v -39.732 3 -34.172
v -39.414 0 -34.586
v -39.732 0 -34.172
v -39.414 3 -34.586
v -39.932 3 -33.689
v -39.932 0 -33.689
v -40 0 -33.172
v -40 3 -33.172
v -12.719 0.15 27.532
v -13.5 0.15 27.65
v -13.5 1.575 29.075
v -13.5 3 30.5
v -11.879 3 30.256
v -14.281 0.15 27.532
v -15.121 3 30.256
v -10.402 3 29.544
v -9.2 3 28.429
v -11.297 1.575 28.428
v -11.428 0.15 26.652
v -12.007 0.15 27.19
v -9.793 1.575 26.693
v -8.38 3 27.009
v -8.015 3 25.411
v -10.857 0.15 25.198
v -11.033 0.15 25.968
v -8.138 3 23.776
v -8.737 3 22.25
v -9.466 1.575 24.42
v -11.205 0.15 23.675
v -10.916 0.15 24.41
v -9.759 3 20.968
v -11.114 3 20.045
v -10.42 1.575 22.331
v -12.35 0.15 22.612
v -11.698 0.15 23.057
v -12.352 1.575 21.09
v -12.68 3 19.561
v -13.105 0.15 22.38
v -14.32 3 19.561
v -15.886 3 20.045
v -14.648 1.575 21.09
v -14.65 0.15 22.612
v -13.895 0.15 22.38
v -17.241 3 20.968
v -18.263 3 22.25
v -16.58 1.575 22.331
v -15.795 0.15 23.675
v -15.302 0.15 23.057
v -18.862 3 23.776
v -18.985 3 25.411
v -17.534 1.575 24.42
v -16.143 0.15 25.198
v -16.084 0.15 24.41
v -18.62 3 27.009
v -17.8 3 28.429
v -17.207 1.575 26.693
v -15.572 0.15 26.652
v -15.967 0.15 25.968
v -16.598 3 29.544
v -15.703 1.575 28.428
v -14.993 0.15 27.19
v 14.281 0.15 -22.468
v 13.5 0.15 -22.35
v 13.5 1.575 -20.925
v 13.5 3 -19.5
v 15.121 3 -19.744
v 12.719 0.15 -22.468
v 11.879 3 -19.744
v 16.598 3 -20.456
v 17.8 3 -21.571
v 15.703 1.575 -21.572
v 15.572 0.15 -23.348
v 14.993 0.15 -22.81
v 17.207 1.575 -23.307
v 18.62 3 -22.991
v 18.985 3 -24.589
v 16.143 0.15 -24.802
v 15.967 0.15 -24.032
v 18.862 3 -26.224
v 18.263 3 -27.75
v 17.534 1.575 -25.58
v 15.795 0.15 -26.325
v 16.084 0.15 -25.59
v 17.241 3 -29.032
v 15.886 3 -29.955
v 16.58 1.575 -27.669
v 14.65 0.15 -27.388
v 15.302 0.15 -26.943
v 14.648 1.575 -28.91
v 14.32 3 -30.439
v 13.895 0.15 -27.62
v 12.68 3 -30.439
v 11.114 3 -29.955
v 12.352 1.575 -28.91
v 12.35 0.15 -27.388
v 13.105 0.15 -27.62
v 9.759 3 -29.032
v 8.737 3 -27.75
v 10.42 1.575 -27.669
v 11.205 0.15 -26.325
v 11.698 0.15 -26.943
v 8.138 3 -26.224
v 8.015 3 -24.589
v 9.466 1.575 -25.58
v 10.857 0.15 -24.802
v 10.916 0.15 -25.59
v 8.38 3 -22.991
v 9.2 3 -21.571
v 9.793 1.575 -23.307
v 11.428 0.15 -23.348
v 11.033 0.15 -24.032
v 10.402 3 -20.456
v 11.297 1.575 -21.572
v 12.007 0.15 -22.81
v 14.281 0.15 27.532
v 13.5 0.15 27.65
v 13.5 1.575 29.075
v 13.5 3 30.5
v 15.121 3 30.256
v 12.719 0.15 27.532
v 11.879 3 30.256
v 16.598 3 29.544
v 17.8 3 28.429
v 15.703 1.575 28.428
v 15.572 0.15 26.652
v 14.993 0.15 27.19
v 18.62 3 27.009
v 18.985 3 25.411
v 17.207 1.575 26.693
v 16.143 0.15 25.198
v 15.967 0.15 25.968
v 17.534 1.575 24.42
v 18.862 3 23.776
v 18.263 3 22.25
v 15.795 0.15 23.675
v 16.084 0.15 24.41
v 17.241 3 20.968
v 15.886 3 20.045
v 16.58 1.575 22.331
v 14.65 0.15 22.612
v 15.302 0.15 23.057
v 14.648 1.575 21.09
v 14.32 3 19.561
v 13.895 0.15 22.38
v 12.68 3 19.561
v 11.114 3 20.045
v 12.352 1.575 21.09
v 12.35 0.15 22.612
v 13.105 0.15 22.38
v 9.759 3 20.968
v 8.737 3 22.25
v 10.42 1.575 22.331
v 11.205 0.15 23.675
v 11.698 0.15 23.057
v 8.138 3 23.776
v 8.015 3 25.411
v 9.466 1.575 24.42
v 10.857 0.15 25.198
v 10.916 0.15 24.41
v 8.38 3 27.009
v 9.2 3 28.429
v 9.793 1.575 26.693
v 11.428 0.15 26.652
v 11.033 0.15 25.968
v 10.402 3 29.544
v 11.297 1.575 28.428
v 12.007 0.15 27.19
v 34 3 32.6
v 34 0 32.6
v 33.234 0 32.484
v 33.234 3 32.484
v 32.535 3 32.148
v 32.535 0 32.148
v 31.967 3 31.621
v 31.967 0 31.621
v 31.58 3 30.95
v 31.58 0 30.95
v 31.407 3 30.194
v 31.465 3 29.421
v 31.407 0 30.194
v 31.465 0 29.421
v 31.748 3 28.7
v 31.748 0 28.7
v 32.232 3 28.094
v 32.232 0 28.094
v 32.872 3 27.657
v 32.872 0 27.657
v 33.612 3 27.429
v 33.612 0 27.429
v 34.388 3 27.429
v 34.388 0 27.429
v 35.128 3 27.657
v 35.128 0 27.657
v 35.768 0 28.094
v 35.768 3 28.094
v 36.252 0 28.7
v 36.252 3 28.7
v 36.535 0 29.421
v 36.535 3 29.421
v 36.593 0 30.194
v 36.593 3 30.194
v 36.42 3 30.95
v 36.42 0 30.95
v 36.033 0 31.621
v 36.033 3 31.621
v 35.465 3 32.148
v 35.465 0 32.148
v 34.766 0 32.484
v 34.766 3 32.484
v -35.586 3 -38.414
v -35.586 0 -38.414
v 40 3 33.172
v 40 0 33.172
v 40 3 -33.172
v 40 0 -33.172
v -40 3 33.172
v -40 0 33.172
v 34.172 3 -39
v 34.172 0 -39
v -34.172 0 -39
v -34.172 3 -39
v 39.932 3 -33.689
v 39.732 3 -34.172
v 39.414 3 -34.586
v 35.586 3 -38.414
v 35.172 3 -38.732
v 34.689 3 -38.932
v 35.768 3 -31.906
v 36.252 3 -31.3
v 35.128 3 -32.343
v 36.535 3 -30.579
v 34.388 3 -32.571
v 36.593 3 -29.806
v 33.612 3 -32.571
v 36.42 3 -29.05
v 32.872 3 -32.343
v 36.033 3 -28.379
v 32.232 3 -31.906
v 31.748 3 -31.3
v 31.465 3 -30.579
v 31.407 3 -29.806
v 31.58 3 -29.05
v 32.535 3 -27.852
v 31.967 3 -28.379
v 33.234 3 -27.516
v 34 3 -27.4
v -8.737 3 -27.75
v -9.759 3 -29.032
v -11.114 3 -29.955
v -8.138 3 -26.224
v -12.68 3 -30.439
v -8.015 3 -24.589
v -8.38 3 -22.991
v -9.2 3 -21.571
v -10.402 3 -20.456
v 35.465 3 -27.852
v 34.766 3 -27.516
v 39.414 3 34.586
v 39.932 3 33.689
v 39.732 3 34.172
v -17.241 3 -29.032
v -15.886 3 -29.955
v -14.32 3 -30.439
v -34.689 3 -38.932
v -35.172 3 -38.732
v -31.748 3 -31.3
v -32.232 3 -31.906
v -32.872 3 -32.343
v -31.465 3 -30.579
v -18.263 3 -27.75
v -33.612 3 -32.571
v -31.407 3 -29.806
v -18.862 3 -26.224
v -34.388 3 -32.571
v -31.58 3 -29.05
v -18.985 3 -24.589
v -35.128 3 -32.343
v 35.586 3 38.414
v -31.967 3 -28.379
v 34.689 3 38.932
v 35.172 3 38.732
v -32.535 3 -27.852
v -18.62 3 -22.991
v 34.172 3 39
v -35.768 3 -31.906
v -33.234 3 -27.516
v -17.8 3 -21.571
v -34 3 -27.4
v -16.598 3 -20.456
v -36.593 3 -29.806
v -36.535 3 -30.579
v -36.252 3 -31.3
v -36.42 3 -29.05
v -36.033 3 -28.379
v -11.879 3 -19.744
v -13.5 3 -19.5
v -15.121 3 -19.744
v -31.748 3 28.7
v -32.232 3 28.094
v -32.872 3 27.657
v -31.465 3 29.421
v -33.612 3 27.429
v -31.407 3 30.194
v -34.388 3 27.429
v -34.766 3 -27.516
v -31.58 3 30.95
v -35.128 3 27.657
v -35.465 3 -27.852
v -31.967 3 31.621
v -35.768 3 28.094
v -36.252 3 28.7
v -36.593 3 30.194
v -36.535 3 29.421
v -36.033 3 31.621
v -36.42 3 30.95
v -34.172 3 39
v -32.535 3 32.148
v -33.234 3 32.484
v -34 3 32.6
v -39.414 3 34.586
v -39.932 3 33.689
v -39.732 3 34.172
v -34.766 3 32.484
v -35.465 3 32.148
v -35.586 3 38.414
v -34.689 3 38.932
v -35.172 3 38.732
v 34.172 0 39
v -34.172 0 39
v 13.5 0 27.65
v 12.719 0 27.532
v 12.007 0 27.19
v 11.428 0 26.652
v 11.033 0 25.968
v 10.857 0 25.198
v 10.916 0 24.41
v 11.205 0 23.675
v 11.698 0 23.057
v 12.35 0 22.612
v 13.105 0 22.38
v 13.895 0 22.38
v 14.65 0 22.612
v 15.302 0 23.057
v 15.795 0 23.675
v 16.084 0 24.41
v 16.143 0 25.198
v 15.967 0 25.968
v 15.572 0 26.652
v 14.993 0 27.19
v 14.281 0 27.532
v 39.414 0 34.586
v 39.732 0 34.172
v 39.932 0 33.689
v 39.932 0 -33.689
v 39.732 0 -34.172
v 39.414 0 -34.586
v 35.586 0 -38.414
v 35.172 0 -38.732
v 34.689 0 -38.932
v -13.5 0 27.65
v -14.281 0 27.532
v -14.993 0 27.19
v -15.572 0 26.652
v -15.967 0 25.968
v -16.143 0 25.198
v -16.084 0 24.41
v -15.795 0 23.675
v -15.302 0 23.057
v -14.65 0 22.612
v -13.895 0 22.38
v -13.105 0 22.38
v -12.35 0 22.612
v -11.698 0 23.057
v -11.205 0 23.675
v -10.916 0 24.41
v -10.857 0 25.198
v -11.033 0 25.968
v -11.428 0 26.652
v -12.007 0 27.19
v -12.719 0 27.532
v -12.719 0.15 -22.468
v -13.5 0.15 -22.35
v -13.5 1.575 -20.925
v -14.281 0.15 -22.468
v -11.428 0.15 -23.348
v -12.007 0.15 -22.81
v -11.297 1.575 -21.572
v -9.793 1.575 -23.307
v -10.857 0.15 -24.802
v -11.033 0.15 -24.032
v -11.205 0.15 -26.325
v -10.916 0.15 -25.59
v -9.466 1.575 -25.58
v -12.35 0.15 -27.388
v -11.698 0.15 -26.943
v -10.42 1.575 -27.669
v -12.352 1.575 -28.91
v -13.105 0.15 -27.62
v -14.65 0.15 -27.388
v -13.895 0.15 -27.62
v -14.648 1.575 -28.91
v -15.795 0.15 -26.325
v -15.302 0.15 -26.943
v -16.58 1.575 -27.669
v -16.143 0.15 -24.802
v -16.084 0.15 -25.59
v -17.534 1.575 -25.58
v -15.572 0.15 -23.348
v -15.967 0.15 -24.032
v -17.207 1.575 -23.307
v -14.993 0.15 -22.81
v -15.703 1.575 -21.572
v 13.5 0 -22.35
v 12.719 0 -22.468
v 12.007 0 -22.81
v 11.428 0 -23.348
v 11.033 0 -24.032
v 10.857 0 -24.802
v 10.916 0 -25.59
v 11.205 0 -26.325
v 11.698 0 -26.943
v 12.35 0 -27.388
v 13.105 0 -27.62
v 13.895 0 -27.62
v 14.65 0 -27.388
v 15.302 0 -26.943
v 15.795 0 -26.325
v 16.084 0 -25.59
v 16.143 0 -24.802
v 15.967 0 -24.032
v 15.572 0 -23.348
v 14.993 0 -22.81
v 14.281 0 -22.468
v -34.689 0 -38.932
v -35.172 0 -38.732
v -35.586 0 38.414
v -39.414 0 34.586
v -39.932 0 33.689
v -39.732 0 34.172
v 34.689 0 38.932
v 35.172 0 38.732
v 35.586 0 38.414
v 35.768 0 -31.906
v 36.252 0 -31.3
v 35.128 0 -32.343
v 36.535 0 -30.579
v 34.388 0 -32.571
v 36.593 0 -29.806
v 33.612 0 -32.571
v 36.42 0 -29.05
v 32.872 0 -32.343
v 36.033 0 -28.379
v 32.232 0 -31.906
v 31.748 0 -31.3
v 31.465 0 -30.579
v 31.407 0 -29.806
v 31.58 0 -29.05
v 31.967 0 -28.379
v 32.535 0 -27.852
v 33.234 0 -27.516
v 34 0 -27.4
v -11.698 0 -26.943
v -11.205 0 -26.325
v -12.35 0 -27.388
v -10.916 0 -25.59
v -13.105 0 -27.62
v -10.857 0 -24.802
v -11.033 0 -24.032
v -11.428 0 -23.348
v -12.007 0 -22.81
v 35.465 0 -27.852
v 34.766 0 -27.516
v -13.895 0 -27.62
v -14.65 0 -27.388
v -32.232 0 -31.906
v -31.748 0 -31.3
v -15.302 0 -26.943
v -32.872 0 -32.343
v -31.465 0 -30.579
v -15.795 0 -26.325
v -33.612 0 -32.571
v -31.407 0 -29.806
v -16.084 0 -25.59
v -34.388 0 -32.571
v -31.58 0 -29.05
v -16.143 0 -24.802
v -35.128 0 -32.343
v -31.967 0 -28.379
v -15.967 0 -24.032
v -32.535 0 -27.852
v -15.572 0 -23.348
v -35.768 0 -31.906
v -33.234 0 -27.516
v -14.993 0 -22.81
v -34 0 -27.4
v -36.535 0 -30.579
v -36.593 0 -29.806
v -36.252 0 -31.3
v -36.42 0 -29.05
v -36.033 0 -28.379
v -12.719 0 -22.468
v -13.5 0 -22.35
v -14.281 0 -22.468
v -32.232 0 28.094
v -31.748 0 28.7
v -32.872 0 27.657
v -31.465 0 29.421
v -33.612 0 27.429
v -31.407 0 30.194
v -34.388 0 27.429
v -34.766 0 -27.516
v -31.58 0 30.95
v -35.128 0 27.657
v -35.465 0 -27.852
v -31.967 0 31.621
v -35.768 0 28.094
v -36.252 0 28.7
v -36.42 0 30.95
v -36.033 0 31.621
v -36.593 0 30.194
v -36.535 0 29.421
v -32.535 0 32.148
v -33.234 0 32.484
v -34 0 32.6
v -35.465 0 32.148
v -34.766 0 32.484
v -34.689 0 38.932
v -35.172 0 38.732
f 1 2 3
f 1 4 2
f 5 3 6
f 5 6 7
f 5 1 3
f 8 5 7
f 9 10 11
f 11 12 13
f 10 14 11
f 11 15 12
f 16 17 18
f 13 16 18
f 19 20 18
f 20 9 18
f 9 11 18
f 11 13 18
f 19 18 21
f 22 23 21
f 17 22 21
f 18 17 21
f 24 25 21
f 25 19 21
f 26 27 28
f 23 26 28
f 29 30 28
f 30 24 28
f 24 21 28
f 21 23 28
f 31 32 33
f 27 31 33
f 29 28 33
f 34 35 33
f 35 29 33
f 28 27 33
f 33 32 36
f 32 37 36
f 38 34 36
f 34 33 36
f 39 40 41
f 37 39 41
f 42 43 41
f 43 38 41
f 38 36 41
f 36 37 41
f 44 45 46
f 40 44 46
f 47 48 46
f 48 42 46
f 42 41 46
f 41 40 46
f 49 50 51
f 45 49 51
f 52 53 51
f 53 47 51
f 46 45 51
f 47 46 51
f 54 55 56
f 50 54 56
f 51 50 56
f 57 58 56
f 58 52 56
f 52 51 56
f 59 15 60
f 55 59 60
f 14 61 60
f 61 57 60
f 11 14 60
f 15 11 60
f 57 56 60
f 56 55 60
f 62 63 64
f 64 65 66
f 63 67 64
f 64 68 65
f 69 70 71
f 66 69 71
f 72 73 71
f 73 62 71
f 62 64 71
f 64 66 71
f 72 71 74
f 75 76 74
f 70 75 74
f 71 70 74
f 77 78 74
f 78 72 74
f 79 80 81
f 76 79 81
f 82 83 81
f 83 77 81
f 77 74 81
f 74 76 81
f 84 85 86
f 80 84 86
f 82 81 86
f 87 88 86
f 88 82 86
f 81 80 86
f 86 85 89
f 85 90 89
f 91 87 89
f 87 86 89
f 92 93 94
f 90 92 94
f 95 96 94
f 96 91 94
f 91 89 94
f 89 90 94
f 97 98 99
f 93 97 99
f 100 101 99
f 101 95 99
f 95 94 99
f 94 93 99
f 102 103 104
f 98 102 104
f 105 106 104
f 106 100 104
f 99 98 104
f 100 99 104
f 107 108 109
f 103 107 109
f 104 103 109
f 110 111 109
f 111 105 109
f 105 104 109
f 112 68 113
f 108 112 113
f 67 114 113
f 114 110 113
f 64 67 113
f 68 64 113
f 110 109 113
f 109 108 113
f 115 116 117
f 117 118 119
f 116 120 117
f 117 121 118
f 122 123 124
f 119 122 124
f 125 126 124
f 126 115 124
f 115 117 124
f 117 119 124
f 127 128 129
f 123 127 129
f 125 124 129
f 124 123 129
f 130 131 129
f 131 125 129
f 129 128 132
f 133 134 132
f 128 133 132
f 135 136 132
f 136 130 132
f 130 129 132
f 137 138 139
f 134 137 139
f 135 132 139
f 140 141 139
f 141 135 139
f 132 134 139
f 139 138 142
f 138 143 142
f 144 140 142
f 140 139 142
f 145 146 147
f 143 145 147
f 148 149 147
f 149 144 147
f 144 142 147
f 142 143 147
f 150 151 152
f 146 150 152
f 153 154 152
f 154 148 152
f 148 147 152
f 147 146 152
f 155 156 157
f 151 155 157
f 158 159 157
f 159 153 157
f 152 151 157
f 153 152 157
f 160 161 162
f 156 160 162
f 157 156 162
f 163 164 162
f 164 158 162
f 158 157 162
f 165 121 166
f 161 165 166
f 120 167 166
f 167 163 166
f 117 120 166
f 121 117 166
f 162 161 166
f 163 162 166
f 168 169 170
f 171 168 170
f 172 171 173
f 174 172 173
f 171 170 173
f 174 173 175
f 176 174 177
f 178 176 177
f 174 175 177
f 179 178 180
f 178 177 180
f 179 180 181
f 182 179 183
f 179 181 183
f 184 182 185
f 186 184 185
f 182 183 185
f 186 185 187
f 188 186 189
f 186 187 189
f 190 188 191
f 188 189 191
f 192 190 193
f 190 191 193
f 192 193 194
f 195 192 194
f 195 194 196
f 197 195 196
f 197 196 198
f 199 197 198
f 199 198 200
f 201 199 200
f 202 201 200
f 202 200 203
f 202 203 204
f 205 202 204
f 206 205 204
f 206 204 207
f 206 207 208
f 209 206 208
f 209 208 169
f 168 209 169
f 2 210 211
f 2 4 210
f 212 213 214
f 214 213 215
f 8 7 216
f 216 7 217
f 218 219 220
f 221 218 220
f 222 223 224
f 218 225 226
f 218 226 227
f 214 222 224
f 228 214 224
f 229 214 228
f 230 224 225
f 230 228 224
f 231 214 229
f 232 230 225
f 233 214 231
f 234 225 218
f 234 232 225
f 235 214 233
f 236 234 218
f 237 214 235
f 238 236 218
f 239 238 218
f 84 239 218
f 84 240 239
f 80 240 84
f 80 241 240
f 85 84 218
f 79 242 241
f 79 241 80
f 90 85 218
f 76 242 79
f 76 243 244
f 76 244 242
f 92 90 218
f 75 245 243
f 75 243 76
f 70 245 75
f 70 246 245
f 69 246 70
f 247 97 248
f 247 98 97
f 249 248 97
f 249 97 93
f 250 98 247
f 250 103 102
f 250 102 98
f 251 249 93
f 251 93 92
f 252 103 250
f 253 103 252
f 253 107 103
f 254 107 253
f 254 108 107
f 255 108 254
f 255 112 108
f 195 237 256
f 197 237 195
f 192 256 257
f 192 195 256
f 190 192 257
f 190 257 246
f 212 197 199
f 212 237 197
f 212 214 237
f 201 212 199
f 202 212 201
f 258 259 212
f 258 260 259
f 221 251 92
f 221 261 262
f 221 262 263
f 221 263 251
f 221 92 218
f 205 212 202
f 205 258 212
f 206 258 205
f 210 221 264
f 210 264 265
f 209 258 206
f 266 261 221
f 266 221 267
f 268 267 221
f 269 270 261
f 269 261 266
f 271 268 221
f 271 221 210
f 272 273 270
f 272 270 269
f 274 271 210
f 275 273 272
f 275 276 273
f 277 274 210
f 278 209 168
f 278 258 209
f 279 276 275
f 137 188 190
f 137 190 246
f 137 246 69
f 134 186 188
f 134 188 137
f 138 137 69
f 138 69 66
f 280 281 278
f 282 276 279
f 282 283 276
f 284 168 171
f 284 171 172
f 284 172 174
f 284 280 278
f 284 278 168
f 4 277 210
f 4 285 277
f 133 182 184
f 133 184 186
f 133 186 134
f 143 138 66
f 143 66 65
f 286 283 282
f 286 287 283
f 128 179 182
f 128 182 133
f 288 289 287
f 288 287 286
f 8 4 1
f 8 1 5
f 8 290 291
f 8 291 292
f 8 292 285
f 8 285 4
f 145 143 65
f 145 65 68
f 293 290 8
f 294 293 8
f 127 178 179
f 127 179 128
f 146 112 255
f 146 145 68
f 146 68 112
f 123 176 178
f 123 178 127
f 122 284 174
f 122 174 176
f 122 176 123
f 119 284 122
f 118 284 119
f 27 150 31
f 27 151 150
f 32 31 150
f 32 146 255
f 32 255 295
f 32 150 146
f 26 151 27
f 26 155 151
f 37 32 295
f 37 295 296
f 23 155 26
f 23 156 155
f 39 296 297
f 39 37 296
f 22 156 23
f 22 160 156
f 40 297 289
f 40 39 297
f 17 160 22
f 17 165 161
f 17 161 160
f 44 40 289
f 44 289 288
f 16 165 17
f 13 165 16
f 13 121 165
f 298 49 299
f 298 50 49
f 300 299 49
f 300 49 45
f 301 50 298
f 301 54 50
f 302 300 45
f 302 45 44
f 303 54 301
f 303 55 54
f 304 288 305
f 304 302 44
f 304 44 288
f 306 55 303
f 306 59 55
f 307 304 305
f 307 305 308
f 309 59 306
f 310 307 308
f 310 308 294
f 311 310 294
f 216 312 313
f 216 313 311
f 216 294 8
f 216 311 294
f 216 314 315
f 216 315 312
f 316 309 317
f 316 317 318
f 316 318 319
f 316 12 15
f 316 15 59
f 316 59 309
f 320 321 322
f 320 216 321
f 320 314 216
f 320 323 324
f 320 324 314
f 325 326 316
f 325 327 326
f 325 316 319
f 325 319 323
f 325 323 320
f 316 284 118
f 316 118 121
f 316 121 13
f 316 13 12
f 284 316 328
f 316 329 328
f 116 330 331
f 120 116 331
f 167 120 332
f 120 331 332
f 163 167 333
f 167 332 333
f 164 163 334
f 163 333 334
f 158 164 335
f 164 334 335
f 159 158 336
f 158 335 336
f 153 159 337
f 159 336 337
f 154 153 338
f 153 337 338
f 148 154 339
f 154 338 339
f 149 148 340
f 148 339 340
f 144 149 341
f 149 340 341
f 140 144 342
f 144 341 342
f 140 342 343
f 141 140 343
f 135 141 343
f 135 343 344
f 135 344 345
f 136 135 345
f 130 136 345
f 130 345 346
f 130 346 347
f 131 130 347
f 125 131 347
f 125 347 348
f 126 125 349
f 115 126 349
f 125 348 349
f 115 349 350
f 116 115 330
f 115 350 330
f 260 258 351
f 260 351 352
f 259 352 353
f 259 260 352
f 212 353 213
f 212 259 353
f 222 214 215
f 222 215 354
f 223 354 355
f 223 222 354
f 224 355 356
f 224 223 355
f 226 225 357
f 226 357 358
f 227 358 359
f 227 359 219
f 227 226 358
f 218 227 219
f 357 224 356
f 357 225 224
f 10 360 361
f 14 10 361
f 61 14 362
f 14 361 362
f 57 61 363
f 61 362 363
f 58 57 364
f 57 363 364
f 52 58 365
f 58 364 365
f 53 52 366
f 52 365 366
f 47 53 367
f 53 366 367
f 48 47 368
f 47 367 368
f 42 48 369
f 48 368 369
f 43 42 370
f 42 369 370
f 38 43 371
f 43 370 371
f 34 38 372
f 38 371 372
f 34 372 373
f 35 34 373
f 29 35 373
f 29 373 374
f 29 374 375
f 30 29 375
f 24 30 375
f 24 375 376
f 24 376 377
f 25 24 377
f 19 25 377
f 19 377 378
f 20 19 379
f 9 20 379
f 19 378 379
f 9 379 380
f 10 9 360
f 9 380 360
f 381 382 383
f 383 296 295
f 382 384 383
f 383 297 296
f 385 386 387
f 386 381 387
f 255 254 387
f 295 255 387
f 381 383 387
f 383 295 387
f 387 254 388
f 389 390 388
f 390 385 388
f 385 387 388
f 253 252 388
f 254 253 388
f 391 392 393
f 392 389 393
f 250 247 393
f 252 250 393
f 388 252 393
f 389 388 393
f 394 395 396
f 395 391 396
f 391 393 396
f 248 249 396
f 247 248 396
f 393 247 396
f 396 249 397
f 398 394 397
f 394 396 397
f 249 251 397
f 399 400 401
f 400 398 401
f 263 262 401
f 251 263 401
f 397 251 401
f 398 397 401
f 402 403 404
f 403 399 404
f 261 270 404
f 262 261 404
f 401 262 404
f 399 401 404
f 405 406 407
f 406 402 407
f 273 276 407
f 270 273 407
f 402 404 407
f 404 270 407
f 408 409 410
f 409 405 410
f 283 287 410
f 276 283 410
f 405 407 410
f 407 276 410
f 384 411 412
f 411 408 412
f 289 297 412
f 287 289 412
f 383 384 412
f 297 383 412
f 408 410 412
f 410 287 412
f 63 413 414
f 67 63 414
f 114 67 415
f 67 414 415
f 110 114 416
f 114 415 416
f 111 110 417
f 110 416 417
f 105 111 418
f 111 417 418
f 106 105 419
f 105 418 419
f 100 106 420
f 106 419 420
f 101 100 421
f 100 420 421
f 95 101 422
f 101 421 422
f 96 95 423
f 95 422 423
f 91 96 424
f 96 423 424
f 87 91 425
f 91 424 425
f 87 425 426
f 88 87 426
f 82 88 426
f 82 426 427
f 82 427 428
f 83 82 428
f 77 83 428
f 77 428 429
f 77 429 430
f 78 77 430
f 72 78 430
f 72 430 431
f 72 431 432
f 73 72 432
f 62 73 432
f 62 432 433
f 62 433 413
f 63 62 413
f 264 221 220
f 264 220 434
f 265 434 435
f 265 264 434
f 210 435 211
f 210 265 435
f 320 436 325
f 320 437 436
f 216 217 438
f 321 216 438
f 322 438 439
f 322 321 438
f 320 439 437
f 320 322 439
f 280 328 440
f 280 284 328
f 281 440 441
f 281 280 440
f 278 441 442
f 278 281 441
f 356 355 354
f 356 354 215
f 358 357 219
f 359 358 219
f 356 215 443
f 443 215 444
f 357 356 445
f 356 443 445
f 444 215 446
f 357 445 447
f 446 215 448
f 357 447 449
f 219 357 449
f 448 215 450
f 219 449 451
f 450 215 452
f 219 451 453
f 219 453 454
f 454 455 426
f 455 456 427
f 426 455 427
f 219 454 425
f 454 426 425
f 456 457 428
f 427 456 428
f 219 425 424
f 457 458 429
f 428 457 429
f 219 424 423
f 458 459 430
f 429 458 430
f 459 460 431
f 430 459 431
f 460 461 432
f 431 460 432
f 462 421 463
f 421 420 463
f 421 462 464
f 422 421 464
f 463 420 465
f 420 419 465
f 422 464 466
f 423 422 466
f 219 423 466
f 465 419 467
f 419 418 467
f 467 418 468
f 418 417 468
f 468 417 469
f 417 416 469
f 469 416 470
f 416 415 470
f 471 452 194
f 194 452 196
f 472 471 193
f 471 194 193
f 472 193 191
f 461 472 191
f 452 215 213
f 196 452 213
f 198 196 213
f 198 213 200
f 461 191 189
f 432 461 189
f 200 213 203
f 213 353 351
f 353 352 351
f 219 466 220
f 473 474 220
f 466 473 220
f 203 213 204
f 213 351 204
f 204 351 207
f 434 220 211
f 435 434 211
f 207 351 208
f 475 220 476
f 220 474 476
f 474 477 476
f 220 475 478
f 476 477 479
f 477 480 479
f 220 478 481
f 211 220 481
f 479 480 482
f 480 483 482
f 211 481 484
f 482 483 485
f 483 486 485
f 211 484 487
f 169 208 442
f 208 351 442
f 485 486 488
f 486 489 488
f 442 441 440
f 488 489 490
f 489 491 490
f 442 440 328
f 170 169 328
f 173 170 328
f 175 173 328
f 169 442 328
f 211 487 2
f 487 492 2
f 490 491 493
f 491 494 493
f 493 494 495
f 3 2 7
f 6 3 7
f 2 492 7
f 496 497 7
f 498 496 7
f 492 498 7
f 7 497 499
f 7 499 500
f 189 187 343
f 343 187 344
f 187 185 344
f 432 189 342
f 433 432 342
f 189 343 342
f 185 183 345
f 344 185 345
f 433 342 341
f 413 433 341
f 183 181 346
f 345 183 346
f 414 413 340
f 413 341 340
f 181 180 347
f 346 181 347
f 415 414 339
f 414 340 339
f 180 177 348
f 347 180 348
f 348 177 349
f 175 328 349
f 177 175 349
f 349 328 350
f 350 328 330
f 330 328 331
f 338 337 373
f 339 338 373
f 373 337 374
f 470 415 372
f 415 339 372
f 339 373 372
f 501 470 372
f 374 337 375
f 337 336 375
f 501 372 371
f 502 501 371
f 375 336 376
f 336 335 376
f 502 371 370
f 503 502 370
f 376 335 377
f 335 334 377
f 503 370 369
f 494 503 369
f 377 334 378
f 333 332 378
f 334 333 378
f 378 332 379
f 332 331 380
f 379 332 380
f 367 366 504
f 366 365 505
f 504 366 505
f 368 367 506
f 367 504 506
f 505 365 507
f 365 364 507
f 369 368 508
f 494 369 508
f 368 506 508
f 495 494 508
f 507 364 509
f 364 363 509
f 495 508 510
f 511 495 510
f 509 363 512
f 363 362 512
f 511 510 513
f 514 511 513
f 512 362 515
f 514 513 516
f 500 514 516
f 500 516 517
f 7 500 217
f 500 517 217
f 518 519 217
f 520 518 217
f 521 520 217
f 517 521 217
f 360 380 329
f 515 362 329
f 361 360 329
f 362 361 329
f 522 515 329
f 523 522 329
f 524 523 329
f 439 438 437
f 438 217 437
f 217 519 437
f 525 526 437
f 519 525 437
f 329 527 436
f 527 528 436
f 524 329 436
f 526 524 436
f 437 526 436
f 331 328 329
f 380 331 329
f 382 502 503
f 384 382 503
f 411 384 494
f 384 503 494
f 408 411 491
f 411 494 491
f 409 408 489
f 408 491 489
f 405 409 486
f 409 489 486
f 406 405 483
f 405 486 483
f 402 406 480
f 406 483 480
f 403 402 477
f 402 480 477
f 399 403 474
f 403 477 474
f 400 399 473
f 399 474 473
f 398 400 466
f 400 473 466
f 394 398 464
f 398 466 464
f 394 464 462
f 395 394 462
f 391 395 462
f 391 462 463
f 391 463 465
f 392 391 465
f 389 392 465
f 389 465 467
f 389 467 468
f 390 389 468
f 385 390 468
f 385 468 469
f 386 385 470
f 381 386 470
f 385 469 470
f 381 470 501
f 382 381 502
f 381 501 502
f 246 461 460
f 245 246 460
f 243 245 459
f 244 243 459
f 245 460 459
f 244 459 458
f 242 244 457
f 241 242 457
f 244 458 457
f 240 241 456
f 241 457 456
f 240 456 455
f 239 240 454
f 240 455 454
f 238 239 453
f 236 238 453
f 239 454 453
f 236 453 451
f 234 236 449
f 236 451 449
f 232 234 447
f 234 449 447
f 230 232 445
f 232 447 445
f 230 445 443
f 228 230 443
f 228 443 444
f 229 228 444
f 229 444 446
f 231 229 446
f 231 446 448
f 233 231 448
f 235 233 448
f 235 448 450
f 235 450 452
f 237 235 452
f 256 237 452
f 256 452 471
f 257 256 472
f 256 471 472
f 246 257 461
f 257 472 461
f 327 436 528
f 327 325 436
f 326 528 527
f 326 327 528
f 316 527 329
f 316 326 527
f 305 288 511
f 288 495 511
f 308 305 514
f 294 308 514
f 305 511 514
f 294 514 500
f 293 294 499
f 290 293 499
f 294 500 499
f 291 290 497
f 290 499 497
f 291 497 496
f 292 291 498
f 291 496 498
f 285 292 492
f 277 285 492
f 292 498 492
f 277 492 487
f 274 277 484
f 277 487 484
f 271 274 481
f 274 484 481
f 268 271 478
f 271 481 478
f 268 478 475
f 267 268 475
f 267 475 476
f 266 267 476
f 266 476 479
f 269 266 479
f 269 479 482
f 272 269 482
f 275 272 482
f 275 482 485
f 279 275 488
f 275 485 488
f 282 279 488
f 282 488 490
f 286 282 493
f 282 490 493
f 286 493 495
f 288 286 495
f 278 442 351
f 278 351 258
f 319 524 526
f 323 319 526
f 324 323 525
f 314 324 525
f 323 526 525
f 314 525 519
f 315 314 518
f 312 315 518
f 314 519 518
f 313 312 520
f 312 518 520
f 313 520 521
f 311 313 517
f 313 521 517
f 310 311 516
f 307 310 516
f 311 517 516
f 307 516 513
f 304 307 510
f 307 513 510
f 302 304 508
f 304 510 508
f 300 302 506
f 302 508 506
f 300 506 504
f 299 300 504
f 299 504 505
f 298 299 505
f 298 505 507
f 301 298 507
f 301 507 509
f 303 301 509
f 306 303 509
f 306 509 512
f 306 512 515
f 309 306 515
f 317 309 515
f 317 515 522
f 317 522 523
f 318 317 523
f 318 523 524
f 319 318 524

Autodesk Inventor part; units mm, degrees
ref_plane "YZ Plane" through (0, 0, 0) normal (1, 0, 0) x (0, 1, 0)
ref_plane "XZ Plane" through (0, 0, 0) normal (0, 1, 0) x (-1, 0, 0)
ref_plane "XY Plane" through (0, 0, 0) normal (0, 0, 1) x (1, 0, 0)
sketch "スケッチ1" plane through (0, 0, 0) normal (0, 1, 0) x (-1, 0, 0)
  line L0 (-40, -39) -> (40, -39)
  line L1 (40, -39) -> (40, 39)
  line L2 (40, 39) -> (-40, 39)
  line L3 (-40, 39) -> (-40, -39)
  line L4 (-40, -39) -> (40, 39) construction
  line L5 (40, -39) -> (-40, 39) construction
  point P0 (0, 0)
  dimension "d0" = 80
  dimension "d1" = 78
extrude "押し出し1" add sketch "スケッチ1" along normal blind 3
sketch "スケッチ2" plane through (0, 3, 0) normal (0, 1, 0) x (1, 0, 0)
  line L0 (34, 30) -> (-34, 30)
  line L1 (-34, 30) -> (-34, -30)
  line L2 (-34, -30) -> (34, -30)
  line L3 (34, -30) -> (34, 30)
  line L4 (34, 30) -> (-34, -30) construction
  line L5 (-34, 30) -> (34, -30) construction
  point P0 (0, 0)
  dimension "d4" = 68
  dimension "d5" = 60
hole "穴1" at (-34, 3, 30) at (34, 3, 30) at (34, 3, -30) at (-34, 3, -30) direction (0, -1, 0) diameter 5.2 depth 8 tip angle 118
sketch "スケッチ3" plane through (0, 3, 0) normal (0, 1, 0) x (1, 0, 0)
  line L0 (13.5, 25) -> (-13.5, 25)
  line L1 (-13.5, 25) -> (-13.5, -25)
  line L2 (-13.5, -25) -> (13.5, -25)
  line L3 (13.5, -25) -> (13.5, 25)
  line L4 (13.5, 25) -> (-13.5, -25) construction
  line L5 (-13.5, 25) -> (13.5, -25) construction
  point P0 (0, 0)
  dimension "d13" = 27
  dimension "d14" = 50
hole "穴2" at (-13.5, 3, 25) at (13.5, 3, 25) at (13.5, 3, -25) at (-13.5, 3, -25) direction (0, -1, 0) diameter 5.3 depth 8 tip angle 118 countersink diameter 11 countersink angle 90
chamfer "面取り1" distance 5 angle 45 4 edges at (-40, 1.5, 39) (40, 1.5, 39) (40, 1.5, -39) (-40, 1.5, -39)
fillet "フィレット3" radius 2 8 edges at (-35, 1.5, 39) (35, 1.5, 39) (40, 1.5, 34) (40, 1.5, -34) (35, 1.5, -39) (-40, 1.5, -34) (-35, 1.5, -39) (-40, 1.5, 34)
properties part number "CCM_Mount_A"
